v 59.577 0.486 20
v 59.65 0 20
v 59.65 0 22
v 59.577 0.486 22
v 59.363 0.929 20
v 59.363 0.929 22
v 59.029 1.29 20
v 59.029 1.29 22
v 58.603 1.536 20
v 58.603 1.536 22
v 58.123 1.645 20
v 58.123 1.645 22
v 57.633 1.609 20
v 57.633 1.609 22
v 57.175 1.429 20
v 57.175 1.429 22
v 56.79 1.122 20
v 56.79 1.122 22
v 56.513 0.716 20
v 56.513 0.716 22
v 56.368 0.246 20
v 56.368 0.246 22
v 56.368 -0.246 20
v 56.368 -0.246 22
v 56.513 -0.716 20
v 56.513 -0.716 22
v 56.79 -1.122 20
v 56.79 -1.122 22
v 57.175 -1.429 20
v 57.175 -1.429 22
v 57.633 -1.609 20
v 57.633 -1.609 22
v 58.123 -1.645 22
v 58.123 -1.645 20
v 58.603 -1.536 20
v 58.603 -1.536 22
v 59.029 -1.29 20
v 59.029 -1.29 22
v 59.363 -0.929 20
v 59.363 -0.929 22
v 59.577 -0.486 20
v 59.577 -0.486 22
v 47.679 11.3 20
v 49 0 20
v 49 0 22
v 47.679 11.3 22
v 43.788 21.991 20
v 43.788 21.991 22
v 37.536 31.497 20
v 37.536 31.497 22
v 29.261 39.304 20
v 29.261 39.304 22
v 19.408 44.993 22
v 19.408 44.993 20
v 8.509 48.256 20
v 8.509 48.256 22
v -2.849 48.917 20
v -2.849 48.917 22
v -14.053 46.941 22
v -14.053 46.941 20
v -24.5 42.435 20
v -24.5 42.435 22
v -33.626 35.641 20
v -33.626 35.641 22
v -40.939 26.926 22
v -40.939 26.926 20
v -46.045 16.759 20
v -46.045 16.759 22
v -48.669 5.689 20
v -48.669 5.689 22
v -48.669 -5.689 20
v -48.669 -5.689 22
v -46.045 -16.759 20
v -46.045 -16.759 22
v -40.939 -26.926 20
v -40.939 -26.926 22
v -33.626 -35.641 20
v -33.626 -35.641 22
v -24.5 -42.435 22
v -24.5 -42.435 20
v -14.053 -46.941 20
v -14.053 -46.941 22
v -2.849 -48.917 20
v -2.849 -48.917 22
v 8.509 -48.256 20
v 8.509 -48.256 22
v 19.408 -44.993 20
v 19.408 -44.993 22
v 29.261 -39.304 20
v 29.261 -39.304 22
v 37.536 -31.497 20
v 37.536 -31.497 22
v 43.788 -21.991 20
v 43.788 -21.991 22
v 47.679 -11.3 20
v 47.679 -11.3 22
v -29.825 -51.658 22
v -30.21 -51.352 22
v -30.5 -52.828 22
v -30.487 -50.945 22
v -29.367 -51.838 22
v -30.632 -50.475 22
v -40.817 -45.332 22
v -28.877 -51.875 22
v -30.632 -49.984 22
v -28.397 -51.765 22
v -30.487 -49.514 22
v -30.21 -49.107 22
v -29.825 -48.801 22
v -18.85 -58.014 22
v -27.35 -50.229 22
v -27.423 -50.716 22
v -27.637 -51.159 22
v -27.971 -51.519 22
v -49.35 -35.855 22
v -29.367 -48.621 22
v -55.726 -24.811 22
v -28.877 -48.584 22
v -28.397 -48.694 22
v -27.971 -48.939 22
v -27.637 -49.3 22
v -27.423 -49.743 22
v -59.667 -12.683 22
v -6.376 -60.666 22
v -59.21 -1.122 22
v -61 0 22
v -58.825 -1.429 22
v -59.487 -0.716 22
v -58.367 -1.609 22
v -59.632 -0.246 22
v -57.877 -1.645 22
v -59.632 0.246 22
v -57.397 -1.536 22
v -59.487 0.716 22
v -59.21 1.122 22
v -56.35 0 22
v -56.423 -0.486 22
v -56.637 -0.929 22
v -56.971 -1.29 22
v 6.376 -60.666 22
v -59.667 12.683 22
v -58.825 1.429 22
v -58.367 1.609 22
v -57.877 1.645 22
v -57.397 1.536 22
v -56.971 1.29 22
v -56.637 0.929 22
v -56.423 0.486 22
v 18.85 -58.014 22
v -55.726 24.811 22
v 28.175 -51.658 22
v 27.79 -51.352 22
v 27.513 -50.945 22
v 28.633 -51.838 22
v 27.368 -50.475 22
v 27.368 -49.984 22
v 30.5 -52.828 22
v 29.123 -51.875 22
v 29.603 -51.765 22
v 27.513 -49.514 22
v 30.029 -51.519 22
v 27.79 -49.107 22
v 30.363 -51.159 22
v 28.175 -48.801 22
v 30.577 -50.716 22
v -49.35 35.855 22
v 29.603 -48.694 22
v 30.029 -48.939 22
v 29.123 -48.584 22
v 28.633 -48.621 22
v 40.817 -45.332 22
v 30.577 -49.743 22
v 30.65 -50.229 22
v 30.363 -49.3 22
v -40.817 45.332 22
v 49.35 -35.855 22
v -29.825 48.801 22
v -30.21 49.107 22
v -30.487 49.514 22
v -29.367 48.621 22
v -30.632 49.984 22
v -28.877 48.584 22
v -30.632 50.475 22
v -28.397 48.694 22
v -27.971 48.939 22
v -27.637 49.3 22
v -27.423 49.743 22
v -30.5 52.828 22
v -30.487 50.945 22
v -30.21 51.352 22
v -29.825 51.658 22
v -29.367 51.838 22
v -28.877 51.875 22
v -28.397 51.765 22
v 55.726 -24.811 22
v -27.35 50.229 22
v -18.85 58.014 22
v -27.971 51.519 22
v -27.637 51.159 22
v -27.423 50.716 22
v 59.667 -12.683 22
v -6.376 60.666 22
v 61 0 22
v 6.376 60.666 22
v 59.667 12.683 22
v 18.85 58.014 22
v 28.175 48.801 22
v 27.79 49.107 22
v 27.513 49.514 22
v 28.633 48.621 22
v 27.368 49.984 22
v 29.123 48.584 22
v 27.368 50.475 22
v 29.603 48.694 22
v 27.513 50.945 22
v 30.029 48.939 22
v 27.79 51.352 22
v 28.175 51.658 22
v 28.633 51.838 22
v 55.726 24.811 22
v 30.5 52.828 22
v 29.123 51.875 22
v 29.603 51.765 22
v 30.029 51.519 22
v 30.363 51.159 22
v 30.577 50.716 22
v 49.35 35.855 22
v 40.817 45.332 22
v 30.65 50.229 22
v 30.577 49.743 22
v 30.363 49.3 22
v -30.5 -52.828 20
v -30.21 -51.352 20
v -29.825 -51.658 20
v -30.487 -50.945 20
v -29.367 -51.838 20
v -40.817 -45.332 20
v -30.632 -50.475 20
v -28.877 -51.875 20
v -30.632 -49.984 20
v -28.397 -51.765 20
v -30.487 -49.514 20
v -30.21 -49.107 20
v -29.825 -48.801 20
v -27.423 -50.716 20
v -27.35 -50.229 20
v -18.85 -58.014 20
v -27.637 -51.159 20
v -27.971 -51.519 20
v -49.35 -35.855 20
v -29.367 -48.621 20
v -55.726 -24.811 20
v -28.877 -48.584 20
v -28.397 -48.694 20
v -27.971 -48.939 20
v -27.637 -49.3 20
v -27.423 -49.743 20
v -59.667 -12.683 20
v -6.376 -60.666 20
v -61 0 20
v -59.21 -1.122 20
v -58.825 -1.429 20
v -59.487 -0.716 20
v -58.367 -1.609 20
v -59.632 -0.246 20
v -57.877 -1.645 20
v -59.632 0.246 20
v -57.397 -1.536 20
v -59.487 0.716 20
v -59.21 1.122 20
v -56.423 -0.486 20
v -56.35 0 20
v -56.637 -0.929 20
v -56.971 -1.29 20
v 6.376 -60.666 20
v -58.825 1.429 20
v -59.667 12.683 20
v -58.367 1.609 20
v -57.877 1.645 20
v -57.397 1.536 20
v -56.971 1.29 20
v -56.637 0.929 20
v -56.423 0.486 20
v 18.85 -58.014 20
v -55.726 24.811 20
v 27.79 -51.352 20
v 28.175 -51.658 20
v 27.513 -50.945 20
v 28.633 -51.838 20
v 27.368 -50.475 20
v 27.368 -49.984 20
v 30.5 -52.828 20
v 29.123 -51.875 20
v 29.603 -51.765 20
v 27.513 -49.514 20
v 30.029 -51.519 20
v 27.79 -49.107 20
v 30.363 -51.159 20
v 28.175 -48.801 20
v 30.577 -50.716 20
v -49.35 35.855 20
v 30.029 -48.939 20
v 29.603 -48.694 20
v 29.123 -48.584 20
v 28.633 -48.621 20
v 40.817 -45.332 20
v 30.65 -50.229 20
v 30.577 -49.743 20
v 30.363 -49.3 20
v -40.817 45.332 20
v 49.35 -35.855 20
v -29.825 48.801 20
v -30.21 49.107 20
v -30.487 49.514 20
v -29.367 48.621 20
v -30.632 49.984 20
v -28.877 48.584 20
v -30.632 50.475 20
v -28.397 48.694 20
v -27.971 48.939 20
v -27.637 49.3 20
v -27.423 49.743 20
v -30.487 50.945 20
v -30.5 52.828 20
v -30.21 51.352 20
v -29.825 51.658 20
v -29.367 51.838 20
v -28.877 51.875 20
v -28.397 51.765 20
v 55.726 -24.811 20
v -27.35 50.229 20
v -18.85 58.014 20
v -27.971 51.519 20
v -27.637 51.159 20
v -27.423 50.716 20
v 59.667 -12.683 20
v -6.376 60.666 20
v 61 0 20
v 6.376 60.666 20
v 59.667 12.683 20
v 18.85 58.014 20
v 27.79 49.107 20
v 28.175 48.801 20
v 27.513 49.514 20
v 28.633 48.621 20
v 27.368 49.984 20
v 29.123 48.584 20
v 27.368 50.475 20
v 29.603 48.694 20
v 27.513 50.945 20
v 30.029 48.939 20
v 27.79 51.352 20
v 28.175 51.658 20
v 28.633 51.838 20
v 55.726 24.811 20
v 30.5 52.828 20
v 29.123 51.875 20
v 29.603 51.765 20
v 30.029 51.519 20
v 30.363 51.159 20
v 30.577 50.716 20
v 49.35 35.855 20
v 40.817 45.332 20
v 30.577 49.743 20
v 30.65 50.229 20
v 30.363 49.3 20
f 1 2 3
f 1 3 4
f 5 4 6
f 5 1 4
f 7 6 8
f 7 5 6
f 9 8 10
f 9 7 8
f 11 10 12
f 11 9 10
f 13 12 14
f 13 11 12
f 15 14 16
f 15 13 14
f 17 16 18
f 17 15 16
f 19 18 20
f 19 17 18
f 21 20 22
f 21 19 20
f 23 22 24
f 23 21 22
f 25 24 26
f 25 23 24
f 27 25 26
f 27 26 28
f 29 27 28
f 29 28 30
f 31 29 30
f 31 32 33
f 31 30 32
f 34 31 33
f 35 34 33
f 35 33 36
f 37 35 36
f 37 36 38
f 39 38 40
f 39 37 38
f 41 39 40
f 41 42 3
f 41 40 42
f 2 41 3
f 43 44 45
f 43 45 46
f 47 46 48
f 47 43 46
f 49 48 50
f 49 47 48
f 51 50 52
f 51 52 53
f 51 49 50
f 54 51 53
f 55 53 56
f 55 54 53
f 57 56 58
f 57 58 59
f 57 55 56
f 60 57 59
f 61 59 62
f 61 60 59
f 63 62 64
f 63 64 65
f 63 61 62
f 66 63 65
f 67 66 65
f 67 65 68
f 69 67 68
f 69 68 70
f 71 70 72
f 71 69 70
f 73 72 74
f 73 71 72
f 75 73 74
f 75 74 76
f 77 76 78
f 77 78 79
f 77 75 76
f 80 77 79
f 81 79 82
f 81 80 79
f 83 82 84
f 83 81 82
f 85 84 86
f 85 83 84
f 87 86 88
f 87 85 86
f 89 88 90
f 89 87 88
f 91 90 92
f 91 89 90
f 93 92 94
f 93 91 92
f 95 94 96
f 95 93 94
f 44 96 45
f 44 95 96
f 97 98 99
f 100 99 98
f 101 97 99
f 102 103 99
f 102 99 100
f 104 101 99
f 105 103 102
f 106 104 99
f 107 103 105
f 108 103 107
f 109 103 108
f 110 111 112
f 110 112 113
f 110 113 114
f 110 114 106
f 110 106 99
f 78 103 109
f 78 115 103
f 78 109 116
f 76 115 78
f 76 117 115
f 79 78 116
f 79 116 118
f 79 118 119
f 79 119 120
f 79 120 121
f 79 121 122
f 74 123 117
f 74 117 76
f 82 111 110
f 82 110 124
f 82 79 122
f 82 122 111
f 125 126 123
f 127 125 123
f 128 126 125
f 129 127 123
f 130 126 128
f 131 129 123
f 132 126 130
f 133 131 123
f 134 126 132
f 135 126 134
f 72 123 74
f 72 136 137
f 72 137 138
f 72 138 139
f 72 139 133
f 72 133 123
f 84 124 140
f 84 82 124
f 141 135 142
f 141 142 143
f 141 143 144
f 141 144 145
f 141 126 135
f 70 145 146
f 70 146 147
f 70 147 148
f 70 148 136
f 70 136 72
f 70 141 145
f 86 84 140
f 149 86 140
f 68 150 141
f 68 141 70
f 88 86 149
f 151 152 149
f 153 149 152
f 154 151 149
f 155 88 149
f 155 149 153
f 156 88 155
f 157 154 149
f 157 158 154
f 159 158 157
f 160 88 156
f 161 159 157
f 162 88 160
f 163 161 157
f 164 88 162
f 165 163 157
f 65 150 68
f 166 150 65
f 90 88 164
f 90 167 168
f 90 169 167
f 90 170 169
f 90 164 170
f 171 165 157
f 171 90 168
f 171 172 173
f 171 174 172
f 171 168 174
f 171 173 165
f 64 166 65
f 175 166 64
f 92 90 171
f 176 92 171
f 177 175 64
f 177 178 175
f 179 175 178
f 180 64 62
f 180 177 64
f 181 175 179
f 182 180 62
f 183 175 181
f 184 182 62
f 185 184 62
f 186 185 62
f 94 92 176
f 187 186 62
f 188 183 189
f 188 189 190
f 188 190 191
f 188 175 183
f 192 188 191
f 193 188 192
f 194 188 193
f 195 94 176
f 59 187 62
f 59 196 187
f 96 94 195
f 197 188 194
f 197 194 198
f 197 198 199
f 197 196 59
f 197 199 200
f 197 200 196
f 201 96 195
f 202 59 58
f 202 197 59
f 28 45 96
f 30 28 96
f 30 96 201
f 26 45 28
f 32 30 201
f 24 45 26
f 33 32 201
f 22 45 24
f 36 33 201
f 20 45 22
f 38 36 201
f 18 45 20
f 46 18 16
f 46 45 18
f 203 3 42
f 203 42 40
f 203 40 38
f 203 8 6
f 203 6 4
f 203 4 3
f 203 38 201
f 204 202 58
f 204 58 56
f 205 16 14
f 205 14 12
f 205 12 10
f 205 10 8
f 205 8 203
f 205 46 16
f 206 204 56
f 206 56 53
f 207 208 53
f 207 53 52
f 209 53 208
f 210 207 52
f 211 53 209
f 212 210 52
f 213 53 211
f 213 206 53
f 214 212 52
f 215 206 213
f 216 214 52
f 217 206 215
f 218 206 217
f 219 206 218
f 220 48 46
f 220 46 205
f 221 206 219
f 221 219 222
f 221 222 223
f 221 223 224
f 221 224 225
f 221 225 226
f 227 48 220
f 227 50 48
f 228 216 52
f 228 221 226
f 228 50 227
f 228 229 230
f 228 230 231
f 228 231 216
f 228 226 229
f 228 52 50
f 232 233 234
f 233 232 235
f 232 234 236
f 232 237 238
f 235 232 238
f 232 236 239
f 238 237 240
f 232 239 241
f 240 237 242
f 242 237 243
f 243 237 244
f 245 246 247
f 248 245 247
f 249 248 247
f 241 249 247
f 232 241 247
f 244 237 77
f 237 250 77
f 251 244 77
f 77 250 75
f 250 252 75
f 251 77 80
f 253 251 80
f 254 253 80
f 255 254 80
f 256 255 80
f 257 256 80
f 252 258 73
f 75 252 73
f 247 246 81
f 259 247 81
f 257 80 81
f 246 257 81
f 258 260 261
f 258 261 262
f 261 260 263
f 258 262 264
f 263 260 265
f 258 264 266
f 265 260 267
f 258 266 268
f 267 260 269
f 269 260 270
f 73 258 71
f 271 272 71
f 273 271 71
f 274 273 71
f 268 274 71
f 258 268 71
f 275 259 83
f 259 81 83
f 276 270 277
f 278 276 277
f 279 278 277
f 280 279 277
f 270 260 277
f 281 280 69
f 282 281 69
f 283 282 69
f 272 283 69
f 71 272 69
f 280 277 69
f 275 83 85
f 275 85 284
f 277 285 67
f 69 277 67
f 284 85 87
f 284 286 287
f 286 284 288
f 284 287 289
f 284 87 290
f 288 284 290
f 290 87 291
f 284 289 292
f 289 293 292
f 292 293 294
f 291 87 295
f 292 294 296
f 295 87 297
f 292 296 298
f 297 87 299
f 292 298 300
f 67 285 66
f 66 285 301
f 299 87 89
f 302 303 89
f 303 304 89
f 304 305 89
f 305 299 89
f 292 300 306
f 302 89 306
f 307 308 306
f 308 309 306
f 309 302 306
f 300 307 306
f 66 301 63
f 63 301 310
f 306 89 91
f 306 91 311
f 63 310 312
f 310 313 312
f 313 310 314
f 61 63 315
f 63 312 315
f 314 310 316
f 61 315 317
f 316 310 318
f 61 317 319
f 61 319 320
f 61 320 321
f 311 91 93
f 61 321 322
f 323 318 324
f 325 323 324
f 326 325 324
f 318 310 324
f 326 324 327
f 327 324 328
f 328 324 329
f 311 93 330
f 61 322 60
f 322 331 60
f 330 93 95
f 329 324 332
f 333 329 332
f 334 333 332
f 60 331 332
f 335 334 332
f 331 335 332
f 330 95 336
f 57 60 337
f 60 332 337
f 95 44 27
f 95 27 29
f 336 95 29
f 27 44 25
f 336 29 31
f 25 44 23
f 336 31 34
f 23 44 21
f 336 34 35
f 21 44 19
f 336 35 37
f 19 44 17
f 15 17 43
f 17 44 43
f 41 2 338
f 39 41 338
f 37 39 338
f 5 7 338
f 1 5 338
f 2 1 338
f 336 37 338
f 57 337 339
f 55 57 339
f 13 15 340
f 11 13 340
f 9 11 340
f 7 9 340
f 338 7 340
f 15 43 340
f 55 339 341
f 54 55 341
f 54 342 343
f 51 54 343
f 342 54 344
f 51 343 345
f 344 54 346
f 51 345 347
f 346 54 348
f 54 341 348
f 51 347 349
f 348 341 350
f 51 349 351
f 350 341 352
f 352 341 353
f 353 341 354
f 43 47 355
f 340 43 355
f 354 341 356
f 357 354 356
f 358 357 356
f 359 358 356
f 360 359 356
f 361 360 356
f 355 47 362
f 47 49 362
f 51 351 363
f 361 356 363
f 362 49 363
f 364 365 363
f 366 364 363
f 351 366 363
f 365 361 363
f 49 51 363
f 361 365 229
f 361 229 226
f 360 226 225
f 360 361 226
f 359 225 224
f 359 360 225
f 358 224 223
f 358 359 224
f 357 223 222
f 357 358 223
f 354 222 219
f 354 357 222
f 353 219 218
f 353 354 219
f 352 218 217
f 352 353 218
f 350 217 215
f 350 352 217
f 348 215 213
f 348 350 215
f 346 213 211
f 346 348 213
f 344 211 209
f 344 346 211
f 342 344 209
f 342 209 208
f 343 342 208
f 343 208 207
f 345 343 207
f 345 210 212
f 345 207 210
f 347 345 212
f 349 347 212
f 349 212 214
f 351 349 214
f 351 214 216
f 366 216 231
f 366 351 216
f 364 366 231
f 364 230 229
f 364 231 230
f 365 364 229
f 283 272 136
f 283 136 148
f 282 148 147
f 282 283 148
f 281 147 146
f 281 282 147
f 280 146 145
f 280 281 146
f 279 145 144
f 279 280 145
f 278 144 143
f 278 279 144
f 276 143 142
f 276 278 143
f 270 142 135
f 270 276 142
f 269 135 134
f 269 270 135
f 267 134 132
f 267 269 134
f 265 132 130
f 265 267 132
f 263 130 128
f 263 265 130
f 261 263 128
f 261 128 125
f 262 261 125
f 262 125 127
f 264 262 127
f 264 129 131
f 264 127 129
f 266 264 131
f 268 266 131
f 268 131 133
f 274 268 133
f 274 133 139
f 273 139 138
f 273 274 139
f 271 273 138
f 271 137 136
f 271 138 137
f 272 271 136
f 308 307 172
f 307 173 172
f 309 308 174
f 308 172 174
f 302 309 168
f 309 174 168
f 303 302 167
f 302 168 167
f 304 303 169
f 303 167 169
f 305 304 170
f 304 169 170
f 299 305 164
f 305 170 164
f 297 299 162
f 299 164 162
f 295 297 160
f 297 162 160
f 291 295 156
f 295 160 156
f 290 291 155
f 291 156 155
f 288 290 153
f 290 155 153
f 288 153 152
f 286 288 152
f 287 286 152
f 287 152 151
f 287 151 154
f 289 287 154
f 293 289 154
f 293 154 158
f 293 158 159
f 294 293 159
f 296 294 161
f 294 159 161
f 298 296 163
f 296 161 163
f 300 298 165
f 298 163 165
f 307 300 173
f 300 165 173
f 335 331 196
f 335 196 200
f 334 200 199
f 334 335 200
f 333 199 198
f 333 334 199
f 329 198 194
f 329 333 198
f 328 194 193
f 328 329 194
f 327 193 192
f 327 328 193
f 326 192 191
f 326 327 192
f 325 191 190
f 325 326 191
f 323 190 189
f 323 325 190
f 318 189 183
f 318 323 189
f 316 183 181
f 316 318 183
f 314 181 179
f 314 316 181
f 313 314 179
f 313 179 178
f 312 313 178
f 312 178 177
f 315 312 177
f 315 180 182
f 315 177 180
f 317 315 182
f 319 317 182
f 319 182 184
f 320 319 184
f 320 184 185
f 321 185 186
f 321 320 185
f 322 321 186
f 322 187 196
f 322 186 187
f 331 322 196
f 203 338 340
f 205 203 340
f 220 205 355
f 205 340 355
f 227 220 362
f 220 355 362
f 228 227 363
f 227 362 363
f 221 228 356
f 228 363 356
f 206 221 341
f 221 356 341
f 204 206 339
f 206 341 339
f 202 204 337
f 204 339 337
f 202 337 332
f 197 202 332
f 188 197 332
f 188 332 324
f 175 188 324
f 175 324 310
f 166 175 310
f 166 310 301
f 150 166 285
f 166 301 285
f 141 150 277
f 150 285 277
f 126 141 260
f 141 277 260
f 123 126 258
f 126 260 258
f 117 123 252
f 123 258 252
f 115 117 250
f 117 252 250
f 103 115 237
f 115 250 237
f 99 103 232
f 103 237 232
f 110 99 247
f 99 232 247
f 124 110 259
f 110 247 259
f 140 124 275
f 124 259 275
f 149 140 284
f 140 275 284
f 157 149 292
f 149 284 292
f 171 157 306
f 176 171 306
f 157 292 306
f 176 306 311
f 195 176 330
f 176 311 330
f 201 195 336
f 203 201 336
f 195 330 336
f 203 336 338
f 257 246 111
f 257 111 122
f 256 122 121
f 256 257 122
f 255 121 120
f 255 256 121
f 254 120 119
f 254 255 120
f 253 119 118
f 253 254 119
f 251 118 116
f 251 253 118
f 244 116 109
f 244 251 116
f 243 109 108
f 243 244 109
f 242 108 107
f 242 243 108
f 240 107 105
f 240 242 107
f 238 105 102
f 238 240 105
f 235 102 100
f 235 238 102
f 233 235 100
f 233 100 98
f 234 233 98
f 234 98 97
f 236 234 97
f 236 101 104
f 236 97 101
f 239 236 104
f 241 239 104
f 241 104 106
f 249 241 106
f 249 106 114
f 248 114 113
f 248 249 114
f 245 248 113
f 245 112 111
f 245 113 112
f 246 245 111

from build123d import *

# Parameters (mm, degrees)
STATOR_CLAMP_START  = 20
SKETCH_1_R          = 61
SKETCH_1_R_2        = 49
STATOR_CLAMP_DEPTH  = 2
SKETCH_2_R          = 1.65
THROUGH_HOLES_DEPTH = 100


with BuildPart() as part:
    # Эскиз1 → Stator_clamp (new body)
    with BuildSketch(Plane.XY.offset(STATOR_CLAMP_START)):
        Circle(SKETCH_1_R)
        Circle(SKETCH_1_R_2, mode=Mode.SUBTRACT)
    extrude(amount=STATOR_CLAMP_DEPTH)

    # Эскиз2 → Through_holes (cut, symmetric)
    with BuildSketch(Plane.XY):
        with Locations((58, 0)):
            Circle(SKETCH_2_R)
        with Locations((29, 50.229473419)):
            Circle(SKETCH_2_R)
        with Locations((-29, 50.229473419)):
            Circle(SKETCH_2_R)
        with Locations((-58, 0)):
            Circle(SKETCH_2_R)
        with Locations((-29, -50.229473419)):
            Circle(SKETCH_2_R)
        with Locations((29, -50.229473419)):
            Circle(SKETCH_2_R)
    extrude(amount=THROUGH_HOLES_DEPTH, both=True, mode=Mode.SUBTRACT)


solid = part.part
